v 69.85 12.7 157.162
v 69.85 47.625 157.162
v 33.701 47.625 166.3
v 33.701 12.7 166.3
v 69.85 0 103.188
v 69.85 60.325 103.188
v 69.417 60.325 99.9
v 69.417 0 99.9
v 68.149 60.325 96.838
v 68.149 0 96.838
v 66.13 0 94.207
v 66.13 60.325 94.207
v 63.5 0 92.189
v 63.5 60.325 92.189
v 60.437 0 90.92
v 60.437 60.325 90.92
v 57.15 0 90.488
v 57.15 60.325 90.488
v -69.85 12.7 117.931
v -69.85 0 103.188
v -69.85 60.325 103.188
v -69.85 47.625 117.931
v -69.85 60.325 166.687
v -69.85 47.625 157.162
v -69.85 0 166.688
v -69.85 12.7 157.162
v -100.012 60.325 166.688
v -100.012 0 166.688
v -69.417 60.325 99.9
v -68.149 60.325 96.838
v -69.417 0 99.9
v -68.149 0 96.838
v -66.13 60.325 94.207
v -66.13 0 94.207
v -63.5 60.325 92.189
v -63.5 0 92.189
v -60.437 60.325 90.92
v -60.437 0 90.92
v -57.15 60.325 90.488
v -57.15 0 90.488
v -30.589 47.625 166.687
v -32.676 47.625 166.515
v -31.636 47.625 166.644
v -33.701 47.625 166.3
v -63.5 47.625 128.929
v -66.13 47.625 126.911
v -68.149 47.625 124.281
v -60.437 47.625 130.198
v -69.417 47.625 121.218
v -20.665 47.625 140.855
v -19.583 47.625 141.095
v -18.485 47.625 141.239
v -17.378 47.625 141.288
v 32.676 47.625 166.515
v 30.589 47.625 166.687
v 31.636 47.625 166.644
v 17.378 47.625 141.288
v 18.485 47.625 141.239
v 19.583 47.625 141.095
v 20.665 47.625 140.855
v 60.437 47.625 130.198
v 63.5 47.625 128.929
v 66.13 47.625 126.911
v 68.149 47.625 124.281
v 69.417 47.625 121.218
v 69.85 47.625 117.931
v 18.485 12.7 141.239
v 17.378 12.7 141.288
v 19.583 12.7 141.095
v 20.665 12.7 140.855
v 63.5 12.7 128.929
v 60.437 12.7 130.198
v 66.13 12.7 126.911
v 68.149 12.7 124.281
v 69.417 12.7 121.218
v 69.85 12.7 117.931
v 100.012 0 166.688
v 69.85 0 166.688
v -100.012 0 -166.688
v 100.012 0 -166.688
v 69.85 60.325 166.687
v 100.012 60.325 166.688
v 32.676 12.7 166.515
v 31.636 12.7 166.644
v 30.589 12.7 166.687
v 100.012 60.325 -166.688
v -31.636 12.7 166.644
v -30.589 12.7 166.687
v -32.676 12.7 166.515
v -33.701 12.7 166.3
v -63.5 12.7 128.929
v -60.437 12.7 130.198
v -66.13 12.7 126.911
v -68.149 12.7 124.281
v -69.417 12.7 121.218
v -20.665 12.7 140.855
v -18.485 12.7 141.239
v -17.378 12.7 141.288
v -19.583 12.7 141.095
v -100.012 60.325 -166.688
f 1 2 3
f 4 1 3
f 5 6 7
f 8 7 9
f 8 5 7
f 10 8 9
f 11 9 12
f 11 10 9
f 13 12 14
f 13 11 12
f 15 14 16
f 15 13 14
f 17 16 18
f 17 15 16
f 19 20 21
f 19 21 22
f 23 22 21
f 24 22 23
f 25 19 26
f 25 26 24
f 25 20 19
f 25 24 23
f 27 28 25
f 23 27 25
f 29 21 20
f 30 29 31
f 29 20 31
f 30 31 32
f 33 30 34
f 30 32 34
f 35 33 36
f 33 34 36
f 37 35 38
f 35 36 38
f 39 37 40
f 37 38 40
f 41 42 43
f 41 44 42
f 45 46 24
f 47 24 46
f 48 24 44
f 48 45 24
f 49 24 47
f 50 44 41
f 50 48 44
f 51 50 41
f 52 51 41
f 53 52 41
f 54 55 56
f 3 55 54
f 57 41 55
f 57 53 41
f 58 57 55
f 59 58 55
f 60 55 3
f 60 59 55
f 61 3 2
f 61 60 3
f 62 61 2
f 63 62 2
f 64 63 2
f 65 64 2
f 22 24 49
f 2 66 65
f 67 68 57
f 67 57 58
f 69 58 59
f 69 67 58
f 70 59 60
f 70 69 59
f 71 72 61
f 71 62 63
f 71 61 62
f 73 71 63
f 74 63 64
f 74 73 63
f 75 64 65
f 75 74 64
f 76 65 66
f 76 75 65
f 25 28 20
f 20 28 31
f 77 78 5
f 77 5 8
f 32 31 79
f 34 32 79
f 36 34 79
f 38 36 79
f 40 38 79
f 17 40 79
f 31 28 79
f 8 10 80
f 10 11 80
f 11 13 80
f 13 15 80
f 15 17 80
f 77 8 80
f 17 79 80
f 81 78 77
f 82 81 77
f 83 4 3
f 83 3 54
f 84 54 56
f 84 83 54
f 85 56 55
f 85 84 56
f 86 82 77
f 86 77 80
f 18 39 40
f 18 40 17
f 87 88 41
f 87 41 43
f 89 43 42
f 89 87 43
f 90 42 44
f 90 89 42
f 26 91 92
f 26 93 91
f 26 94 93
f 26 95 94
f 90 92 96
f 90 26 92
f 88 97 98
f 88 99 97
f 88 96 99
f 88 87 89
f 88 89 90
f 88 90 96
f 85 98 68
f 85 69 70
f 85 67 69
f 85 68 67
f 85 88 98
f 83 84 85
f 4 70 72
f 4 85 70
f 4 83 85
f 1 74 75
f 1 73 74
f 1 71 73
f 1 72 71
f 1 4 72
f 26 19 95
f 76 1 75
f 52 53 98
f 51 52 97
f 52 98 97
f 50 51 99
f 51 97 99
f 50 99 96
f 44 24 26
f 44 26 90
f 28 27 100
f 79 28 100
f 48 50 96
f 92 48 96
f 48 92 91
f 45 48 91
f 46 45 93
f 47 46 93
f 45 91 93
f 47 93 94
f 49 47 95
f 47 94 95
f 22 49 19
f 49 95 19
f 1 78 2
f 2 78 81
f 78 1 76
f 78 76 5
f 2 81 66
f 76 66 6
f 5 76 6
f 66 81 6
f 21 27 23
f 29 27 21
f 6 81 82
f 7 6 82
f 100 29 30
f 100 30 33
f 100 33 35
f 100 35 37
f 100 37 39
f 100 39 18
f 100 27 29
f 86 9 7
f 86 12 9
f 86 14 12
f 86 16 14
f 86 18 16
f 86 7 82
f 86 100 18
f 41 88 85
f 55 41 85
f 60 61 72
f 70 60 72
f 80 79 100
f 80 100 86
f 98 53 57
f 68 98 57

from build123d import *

# Parameters (mm, degrees)
SKETCH1_W           = 419.1
SKETCH1_H           = 333.375
BOSS_EXTRUDE1_DEPTH = 60.325
SKETCH2_W           = 139.7
SKETCH2_H           = 50.8
CUT_EXTRUDE1_DEPTH  = 61.325
CHAMFER1_SIZE       = 50.8
CHAMFER1_SIZE2      = 13.611818976
FILLET1_R           = 12.7
SKETCH3_W           = 139.7
SKETCH3_H           = 56.403006085
CUT_EXTRUDE2_DEPTH  = 12.7
SKETCH4_W           = 139.7
SKETCH4_H           = 56.128435861
CUT_EXTRUDE3_DEPTH  = 12.7
SKETCH5_OUTSIDE_W   = 528.882
SKETCH5_OUTSIDE_H   = 443.156
SKETCH5_OUTSIDE_W_2 = 200.025
SKETCH5_OUTSIDE_H_2 = 333.375
CUT_EXTRUDE4_DEPTH  = 61.325


with BuildPart() as part:
    # Sketch1 → Boss-Extrude1 (new body)
    with BuildSketch(Plane(origin=(0, 0, 0), x_dir=(1, 0, 0), z_dir=(0, 1, 0))):
        Rectangle(SKETCH1_W, SKETCH1_H)
    extrude(amount=BOSS_EXTRUDE1_DEPTH)

    # Sketch2 → Cut-Extrude1 (cut, through all)
    with BuildSketch(Plane(origin=(0, 60.325, 0), x_dir=(1, 0, 0), z_dir=(0, 1, 0))):
        with Locations((0, -115.8875)):
            Rectangle(SKETCH2_W, SKETCH2_H)
        Polygon((-69.85, -166.6875), (-69.85, -157.1625), (-32.169017961, -166.6875), align=None)
        Polygon((32.169017961, -166.6875), (69.85, -166.6875), (69.85, -157.1625), align=None)
    extrude(amount=-CUT_EXTRUDE1_DEPTH, mode=Mode.SUBTRACT)

    # Chamfer1
    chamfer1_edges = [part.edges().sort_by_distance(p)[0] for p in [
        (69.85, 30.1625, 141.2875),
        (-69.85, 30.1625, 141.2875),
    ]]
    chamfer1_side = [part.faces().sort_by_distance(p)[0] for p in [
        (0, 30.1625, 141.2875),
    ]]
    chamfer(chamfer1_edges, length=CHAMFER1_SIZE, length2=CHAMFER1_SIZE2, reference=chamfer1_side[0])

    # Fillet1
    fillet1_edges = [part.edges().sort_by_distance(p)[0] for p in [
        (69.85, 30.1625, 90.4875),
        (-69.85, 30.1625, 90.4875),
        (-32.169017961, 30.1625, 166.6875),
        (32.169017961, 30.1625, 166.6875),
        (69.85, 30.1625, 127.675681024),
        (-19.05, 30.1625, 141.2875),
        (19.05, 30.1625, 141.2875),
        (-69.85, 30.1625, 127.675681024),
    ]]
    fillet(fillet1_edges, radius=FILLET1_R)

    # Sketch3 → Cut-Extrude2 (cut)
    with BuildSketch(Plane(origin=(0, 60.325, 0), x_dir=(1, 0, 0), z_dir=(0, 1, 0))):
        with Locations((0, -138.485996957)):
            Rectangle(SKETCH3_W, SKETCH3_H)
    extrude(amount=-CUT_EXTRUDE2_DEPTH, mode=Mode.SUBTRACT)

    # Sketch4 → Cut-Extrude3 (cut)
    with BuildSketch(Plane.XZ):
        with Locations((0, 138.623282069)):
            Rectangle(SKETCH4_W, SKETCH4_H)
    extrude(amount=-CUT_EXTRUDE3_DEPTH, mode=Mode.SUBTRACT)

    # Sketch5 outside → Cut-Extrude4 (cut, through all)
    with BuildSketch(Plane(origin=(0, 60.325, 0), x_dir=(1, 0, 0), z_dir=(0, 1, 0))):
        Rectangle(SKETCH5_OUTSIDE_W, SKETCH5_OUTSIDE_H)
        Rectangle(SKETCH5_OUTSIDE_W_2, SKETCH5_OUTSIDE_H_2, mode=Mode.SUBTRACT)
    extrude(amount=-CUT_EXTRUDE4_DEPTH, mode=Mode.SUBTRACT)


solid = part.part
